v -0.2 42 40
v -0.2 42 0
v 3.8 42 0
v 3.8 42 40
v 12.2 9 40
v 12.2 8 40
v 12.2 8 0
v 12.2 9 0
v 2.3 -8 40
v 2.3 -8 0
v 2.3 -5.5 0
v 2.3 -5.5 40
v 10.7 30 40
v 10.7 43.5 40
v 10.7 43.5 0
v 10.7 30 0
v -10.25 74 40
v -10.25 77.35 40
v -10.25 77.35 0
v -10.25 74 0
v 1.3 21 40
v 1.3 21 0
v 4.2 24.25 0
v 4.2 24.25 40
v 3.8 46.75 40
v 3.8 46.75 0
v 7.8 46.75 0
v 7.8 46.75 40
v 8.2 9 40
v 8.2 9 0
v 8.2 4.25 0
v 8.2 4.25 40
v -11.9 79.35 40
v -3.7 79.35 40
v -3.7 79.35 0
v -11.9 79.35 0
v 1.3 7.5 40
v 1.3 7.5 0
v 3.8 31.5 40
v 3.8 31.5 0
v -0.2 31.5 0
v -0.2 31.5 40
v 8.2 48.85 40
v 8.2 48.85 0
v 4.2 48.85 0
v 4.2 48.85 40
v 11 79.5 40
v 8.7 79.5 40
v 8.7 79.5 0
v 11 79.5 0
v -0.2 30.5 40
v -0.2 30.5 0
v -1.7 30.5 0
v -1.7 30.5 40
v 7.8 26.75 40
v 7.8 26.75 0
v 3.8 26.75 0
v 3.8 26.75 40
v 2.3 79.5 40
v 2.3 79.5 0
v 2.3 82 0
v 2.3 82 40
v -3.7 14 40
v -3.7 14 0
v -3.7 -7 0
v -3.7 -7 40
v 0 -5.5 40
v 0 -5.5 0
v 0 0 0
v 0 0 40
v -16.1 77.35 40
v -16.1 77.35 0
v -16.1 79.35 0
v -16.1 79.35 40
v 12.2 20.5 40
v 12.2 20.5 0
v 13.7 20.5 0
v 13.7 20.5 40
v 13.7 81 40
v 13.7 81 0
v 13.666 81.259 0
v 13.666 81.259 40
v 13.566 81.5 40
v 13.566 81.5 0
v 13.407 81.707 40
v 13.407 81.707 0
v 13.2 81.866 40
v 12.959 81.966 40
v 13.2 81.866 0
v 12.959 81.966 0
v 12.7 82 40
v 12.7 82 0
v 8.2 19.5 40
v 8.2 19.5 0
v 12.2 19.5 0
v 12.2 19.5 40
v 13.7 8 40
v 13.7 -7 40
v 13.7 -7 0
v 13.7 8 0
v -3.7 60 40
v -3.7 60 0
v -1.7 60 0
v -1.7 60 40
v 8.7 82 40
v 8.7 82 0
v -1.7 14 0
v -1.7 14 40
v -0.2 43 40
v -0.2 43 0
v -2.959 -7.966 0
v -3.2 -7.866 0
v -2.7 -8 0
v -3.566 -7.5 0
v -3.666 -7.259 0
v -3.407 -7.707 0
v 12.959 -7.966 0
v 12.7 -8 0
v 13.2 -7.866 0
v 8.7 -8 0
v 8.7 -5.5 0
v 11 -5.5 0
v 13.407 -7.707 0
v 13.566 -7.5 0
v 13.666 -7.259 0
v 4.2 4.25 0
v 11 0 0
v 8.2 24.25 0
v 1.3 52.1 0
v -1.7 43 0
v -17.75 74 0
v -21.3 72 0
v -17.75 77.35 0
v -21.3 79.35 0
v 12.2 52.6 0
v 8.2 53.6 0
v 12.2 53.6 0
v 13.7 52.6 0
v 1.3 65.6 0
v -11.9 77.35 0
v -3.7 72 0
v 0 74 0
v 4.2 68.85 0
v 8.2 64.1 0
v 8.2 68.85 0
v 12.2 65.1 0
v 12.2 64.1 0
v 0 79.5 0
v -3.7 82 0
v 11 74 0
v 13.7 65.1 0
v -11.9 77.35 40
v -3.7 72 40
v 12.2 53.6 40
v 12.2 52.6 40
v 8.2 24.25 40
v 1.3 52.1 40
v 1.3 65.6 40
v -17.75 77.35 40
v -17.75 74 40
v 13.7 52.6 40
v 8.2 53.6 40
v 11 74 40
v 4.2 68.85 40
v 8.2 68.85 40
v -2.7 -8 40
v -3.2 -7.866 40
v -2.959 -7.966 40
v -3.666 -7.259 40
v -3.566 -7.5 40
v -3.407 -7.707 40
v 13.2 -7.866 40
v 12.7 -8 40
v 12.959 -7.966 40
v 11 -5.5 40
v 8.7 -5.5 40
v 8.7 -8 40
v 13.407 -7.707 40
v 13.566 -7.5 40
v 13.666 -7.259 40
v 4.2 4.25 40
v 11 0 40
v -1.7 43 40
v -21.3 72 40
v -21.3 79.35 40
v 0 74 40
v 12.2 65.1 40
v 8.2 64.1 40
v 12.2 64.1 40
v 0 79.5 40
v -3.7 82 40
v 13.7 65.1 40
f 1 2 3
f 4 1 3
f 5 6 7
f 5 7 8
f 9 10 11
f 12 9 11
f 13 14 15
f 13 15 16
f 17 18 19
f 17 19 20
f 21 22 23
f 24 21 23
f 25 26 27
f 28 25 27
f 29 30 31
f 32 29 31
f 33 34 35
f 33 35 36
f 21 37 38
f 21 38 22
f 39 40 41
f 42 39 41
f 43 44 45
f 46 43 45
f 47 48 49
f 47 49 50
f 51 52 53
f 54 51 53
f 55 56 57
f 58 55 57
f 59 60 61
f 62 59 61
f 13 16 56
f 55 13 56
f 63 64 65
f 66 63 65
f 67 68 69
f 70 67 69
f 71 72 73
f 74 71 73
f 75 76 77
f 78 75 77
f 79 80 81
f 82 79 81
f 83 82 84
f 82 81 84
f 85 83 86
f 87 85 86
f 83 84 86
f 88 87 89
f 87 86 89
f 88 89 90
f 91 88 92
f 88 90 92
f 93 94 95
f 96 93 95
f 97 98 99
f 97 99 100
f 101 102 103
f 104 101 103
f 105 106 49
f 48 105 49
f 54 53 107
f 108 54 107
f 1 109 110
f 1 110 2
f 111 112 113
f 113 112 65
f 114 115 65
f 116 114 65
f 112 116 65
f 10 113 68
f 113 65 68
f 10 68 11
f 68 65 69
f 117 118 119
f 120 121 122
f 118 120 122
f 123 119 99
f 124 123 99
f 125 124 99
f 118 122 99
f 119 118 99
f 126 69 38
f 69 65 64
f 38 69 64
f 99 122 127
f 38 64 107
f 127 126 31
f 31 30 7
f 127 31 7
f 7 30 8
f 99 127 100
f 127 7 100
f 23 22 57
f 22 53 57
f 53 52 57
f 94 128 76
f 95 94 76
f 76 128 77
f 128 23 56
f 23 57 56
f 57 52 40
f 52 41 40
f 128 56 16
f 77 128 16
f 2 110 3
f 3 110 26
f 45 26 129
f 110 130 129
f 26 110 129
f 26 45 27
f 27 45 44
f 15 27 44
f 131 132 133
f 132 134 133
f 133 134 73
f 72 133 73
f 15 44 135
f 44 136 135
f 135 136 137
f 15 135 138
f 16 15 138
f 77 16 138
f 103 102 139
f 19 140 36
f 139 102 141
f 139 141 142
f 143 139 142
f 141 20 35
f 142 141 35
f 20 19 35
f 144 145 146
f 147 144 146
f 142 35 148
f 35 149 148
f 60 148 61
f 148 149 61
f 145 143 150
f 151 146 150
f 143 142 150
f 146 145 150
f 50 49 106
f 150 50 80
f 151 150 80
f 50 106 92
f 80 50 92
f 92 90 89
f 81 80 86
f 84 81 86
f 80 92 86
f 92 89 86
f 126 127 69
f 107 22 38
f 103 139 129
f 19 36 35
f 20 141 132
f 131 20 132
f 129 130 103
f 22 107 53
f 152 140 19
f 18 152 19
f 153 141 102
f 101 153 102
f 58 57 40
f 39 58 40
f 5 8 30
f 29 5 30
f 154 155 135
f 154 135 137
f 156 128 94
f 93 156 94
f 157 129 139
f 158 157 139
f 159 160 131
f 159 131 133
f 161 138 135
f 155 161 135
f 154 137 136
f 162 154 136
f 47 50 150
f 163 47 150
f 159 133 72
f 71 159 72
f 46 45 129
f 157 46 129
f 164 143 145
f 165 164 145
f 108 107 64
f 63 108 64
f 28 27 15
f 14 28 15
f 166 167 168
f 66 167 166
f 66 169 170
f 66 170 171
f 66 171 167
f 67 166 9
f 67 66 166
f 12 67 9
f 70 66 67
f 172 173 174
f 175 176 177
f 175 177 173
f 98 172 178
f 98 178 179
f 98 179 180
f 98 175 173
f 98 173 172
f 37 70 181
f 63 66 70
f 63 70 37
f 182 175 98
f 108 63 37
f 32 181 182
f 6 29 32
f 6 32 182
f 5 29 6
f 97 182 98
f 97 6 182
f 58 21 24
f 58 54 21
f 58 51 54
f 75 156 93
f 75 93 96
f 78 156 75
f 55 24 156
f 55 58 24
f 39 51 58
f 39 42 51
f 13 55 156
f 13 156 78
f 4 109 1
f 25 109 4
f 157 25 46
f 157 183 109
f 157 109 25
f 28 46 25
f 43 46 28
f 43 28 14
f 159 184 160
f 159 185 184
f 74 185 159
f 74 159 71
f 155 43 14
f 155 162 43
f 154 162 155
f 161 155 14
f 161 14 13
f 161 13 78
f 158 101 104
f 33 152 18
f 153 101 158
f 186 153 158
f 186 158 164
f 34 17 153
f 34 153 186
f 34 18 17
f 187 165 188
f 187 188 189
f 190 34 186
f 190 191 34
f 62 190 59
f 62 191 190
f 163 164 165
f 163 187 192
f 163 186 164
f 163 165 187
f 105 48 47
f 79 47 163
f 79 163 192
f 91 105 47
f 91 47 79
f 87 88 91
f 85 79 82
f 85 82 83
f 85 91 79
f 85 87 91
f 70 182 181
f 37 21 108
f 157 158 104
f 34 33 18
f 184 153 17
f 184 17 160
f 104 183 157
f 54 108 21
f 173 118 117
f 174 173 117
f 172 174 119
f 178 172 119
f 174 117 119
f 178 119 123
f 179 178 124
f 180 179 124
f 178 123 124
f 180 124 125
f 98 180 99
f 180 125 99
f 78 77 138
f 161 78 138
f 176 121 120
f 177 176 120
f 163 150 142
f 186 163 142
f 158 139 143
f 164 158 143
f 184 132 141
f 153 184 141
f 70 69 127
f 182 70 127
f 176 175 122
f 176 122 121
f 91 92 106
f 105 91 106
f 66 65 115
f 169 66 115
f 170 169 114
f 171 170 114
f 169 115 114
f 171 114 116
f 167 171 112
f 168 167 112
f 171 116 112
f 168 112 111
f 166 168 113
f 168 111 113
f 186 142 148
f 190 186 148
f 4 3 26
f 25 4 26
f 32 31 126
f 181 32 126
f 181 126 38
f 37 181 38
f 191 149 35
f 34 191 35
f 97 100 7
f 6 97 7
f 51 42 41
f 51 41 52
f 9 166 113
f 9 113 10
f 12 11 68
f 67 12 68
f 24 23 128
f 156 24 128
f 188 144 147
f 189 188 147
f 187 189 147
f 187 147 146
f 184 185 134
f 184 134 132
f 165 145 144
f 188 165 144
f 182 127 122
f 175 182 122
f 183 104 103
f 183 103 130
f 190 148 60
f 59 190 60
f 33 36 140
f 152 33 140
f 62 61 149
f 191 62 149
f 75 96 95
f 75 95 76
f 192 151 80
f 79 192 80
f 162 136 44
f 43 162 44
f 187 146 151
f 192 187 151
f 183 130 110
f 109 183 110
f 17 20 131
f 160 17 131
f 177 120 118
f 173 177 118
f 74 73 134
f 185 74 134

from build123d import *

# Parameters (mm, degrees)
EXTRUDE_1_DEPTH = 40


with BuildPart() as part:
    # Model → Бобышка-Вытянуть1 (new body)
    with BuildSketch(Plane.XY):
        with BuildLine():
            Line((-2.7, -8), (2.3, -8))
            Line((2.3, -8), (2.3, -5.5))
            Line((2.3, -5.5), (0, -5.5))
            Line((0, -5.5), (0, 0))
            Line((0, 0), (11, 0))
            Line((11, 0), (11, -5.5))
            Line((11, -5.5), (8.7, -5.5))
            Line((8.7, -5.5), (8.7, -8))
            Line((8.7, -8), (12.7, -8))
            ThreePointArc((12.7, -8), (13.407106781, -7.707106781), (13.7, -7))
            Line((13.7, -7), (13.7, 8))
            Line((13.7, 8), (12.2, 8))
            Line((12.2, 8), (12.2, 9))
            Line((12.2, 9), (8.2, 9))
            Line((8.2, 9), (8.2, 4.25))
            Line((8.2, 4.25), (4.2, 4.25))
            Line((4.2, 4.25), (1.3, 7.5))
            Line((1.3, 7.5), (1.3, 21))
            Line((1.3, 21), (4.2, 24.25))
            Line((4.2, 24.25), (8.2, 24.25))
            Line((8.2, 24.25), (8.2, 19.5))
            Line((8.2, 19.5), (12.2, 19.5))
            Line((12.2, 19.5), (12.2, 20.5))
            Line((12.2, 20.5), (13.7, 20.5))
            Line((13.7, 20.5), (13.7, 52.6))
            Line((13.7, 52.6), (12.2, 52.6))
            Line((12.2, 52.6), (12.2, 53.6))
            Line((12.2, 53.6), (8.2, 53.6))
            Line((8.2, 53.6), (8.2, 48.85))
            Line((8.2, 48.85), (4.2, 48.85))
            Line((4.2, 48.85), (1.3, 52.1))
            Line((1.3, 52.1), (1.3, 65.6))
            Line((1.3, 65.6), (4.2, 68.85))
            Line((4.2, 68.85), (8.2, 68.85))
            Line((8.2, 68.85), (8.2, 64.1))
            Line((8.2, 64.1), (12.2, 64.1))
            Line((12.2, 64.1), (12.2, 65.1))
            Line((12.2, 65.1), (13.7, 65.1))
            Line((13.7, 65.1), (13.7, 81))
            ThreePointArc((13.7, 81), (13.407106781, 81.707106781), (12.7, 82))
            Line((12.7, 82), (8.7, 82))
            Line((8.7, 82), (8.7, 79.5))
            Line((8.7, 79.5), (11, 79.5))
            Line((11, 79.5), (11, 74))
            Line((11, 74), (0, 74))
            Line((0, 74), (0, 79.5))
            Line((0, 79.5), (2.3, 79.5))
            Line((2.3, 79.5), (2.3, 82))
            Line((2.3, 82), (-3.7, 82))
            Line((-3.7, 82), (-3.7, 79.35))
            Line((-3.7, 79.35), (-11.9, 79.35))
            Line((-11.9, 79.35), (-11.9, 77.35))
            Line((-11.9, 77.35), (-10.25, 77.35))
            Line((-10.25, 77.35), (-10.25, 74))
            Line((-10.25, 74), (-17.75, 74))
            Line((-17.75, 74), (-17.75, 77.35))
            Line((-17.75, 77.35), (-16.1, 77.35))
            Line((-16.1, 77.35), (-16.1, 79.35))
            Line((-16.1, 79.35), (-21.3, 79.35))
            Line((-21.3, 79.35), (-21.3, 72))
            Line((-21.3, 72), (-3.7, 72))
            Line((-3.7, 72), (-3.7, 60))
            Line((-3.7, 60), (-1.7, 60))
            Line((-1.7, 60), (-1.7, 43))
            Line((-1.7, 43), (-0.2, 43))
            Line((-0.2, 43), (-0.2, 42))
            Line((-0.2, 42), (3.8, 42))
            Line((3.8, 42), (3.8, 46.75))
            Line((3.8, 46.75), (7.8, 46.75))
            Line((7.8, 46.75), (10.7, 43.5))
            Line((10.7, 43.5), (10.7, 30))
            Line((10.7, 30), (7.8, 26.75))
            Line((7.8, 26.75), (3.8, 26.75))
            Line((3.8, 26.75), (3.8, 31.5))
            Line((3.8, 31.5), (-0.2, 31.5))
            Line((-0.2, 31.5), (-0.2, 30.5))
            Line((-0.2, 30.5), (-1.7, 30.5))
            Line((-1.7, 30.5), (-1.7, 14))
            Line((-1.7, 14), (-3.7, 14))
            Line((-3.7, 14), (-3.7, -7))
            ThreePointArc((-3.7, -7), (-3.407106781, -7.707106781), (-2.7, -8))
        make_face()
    extrude(amount=EXTRUDE_1_DEPTH)


solid = part.part
